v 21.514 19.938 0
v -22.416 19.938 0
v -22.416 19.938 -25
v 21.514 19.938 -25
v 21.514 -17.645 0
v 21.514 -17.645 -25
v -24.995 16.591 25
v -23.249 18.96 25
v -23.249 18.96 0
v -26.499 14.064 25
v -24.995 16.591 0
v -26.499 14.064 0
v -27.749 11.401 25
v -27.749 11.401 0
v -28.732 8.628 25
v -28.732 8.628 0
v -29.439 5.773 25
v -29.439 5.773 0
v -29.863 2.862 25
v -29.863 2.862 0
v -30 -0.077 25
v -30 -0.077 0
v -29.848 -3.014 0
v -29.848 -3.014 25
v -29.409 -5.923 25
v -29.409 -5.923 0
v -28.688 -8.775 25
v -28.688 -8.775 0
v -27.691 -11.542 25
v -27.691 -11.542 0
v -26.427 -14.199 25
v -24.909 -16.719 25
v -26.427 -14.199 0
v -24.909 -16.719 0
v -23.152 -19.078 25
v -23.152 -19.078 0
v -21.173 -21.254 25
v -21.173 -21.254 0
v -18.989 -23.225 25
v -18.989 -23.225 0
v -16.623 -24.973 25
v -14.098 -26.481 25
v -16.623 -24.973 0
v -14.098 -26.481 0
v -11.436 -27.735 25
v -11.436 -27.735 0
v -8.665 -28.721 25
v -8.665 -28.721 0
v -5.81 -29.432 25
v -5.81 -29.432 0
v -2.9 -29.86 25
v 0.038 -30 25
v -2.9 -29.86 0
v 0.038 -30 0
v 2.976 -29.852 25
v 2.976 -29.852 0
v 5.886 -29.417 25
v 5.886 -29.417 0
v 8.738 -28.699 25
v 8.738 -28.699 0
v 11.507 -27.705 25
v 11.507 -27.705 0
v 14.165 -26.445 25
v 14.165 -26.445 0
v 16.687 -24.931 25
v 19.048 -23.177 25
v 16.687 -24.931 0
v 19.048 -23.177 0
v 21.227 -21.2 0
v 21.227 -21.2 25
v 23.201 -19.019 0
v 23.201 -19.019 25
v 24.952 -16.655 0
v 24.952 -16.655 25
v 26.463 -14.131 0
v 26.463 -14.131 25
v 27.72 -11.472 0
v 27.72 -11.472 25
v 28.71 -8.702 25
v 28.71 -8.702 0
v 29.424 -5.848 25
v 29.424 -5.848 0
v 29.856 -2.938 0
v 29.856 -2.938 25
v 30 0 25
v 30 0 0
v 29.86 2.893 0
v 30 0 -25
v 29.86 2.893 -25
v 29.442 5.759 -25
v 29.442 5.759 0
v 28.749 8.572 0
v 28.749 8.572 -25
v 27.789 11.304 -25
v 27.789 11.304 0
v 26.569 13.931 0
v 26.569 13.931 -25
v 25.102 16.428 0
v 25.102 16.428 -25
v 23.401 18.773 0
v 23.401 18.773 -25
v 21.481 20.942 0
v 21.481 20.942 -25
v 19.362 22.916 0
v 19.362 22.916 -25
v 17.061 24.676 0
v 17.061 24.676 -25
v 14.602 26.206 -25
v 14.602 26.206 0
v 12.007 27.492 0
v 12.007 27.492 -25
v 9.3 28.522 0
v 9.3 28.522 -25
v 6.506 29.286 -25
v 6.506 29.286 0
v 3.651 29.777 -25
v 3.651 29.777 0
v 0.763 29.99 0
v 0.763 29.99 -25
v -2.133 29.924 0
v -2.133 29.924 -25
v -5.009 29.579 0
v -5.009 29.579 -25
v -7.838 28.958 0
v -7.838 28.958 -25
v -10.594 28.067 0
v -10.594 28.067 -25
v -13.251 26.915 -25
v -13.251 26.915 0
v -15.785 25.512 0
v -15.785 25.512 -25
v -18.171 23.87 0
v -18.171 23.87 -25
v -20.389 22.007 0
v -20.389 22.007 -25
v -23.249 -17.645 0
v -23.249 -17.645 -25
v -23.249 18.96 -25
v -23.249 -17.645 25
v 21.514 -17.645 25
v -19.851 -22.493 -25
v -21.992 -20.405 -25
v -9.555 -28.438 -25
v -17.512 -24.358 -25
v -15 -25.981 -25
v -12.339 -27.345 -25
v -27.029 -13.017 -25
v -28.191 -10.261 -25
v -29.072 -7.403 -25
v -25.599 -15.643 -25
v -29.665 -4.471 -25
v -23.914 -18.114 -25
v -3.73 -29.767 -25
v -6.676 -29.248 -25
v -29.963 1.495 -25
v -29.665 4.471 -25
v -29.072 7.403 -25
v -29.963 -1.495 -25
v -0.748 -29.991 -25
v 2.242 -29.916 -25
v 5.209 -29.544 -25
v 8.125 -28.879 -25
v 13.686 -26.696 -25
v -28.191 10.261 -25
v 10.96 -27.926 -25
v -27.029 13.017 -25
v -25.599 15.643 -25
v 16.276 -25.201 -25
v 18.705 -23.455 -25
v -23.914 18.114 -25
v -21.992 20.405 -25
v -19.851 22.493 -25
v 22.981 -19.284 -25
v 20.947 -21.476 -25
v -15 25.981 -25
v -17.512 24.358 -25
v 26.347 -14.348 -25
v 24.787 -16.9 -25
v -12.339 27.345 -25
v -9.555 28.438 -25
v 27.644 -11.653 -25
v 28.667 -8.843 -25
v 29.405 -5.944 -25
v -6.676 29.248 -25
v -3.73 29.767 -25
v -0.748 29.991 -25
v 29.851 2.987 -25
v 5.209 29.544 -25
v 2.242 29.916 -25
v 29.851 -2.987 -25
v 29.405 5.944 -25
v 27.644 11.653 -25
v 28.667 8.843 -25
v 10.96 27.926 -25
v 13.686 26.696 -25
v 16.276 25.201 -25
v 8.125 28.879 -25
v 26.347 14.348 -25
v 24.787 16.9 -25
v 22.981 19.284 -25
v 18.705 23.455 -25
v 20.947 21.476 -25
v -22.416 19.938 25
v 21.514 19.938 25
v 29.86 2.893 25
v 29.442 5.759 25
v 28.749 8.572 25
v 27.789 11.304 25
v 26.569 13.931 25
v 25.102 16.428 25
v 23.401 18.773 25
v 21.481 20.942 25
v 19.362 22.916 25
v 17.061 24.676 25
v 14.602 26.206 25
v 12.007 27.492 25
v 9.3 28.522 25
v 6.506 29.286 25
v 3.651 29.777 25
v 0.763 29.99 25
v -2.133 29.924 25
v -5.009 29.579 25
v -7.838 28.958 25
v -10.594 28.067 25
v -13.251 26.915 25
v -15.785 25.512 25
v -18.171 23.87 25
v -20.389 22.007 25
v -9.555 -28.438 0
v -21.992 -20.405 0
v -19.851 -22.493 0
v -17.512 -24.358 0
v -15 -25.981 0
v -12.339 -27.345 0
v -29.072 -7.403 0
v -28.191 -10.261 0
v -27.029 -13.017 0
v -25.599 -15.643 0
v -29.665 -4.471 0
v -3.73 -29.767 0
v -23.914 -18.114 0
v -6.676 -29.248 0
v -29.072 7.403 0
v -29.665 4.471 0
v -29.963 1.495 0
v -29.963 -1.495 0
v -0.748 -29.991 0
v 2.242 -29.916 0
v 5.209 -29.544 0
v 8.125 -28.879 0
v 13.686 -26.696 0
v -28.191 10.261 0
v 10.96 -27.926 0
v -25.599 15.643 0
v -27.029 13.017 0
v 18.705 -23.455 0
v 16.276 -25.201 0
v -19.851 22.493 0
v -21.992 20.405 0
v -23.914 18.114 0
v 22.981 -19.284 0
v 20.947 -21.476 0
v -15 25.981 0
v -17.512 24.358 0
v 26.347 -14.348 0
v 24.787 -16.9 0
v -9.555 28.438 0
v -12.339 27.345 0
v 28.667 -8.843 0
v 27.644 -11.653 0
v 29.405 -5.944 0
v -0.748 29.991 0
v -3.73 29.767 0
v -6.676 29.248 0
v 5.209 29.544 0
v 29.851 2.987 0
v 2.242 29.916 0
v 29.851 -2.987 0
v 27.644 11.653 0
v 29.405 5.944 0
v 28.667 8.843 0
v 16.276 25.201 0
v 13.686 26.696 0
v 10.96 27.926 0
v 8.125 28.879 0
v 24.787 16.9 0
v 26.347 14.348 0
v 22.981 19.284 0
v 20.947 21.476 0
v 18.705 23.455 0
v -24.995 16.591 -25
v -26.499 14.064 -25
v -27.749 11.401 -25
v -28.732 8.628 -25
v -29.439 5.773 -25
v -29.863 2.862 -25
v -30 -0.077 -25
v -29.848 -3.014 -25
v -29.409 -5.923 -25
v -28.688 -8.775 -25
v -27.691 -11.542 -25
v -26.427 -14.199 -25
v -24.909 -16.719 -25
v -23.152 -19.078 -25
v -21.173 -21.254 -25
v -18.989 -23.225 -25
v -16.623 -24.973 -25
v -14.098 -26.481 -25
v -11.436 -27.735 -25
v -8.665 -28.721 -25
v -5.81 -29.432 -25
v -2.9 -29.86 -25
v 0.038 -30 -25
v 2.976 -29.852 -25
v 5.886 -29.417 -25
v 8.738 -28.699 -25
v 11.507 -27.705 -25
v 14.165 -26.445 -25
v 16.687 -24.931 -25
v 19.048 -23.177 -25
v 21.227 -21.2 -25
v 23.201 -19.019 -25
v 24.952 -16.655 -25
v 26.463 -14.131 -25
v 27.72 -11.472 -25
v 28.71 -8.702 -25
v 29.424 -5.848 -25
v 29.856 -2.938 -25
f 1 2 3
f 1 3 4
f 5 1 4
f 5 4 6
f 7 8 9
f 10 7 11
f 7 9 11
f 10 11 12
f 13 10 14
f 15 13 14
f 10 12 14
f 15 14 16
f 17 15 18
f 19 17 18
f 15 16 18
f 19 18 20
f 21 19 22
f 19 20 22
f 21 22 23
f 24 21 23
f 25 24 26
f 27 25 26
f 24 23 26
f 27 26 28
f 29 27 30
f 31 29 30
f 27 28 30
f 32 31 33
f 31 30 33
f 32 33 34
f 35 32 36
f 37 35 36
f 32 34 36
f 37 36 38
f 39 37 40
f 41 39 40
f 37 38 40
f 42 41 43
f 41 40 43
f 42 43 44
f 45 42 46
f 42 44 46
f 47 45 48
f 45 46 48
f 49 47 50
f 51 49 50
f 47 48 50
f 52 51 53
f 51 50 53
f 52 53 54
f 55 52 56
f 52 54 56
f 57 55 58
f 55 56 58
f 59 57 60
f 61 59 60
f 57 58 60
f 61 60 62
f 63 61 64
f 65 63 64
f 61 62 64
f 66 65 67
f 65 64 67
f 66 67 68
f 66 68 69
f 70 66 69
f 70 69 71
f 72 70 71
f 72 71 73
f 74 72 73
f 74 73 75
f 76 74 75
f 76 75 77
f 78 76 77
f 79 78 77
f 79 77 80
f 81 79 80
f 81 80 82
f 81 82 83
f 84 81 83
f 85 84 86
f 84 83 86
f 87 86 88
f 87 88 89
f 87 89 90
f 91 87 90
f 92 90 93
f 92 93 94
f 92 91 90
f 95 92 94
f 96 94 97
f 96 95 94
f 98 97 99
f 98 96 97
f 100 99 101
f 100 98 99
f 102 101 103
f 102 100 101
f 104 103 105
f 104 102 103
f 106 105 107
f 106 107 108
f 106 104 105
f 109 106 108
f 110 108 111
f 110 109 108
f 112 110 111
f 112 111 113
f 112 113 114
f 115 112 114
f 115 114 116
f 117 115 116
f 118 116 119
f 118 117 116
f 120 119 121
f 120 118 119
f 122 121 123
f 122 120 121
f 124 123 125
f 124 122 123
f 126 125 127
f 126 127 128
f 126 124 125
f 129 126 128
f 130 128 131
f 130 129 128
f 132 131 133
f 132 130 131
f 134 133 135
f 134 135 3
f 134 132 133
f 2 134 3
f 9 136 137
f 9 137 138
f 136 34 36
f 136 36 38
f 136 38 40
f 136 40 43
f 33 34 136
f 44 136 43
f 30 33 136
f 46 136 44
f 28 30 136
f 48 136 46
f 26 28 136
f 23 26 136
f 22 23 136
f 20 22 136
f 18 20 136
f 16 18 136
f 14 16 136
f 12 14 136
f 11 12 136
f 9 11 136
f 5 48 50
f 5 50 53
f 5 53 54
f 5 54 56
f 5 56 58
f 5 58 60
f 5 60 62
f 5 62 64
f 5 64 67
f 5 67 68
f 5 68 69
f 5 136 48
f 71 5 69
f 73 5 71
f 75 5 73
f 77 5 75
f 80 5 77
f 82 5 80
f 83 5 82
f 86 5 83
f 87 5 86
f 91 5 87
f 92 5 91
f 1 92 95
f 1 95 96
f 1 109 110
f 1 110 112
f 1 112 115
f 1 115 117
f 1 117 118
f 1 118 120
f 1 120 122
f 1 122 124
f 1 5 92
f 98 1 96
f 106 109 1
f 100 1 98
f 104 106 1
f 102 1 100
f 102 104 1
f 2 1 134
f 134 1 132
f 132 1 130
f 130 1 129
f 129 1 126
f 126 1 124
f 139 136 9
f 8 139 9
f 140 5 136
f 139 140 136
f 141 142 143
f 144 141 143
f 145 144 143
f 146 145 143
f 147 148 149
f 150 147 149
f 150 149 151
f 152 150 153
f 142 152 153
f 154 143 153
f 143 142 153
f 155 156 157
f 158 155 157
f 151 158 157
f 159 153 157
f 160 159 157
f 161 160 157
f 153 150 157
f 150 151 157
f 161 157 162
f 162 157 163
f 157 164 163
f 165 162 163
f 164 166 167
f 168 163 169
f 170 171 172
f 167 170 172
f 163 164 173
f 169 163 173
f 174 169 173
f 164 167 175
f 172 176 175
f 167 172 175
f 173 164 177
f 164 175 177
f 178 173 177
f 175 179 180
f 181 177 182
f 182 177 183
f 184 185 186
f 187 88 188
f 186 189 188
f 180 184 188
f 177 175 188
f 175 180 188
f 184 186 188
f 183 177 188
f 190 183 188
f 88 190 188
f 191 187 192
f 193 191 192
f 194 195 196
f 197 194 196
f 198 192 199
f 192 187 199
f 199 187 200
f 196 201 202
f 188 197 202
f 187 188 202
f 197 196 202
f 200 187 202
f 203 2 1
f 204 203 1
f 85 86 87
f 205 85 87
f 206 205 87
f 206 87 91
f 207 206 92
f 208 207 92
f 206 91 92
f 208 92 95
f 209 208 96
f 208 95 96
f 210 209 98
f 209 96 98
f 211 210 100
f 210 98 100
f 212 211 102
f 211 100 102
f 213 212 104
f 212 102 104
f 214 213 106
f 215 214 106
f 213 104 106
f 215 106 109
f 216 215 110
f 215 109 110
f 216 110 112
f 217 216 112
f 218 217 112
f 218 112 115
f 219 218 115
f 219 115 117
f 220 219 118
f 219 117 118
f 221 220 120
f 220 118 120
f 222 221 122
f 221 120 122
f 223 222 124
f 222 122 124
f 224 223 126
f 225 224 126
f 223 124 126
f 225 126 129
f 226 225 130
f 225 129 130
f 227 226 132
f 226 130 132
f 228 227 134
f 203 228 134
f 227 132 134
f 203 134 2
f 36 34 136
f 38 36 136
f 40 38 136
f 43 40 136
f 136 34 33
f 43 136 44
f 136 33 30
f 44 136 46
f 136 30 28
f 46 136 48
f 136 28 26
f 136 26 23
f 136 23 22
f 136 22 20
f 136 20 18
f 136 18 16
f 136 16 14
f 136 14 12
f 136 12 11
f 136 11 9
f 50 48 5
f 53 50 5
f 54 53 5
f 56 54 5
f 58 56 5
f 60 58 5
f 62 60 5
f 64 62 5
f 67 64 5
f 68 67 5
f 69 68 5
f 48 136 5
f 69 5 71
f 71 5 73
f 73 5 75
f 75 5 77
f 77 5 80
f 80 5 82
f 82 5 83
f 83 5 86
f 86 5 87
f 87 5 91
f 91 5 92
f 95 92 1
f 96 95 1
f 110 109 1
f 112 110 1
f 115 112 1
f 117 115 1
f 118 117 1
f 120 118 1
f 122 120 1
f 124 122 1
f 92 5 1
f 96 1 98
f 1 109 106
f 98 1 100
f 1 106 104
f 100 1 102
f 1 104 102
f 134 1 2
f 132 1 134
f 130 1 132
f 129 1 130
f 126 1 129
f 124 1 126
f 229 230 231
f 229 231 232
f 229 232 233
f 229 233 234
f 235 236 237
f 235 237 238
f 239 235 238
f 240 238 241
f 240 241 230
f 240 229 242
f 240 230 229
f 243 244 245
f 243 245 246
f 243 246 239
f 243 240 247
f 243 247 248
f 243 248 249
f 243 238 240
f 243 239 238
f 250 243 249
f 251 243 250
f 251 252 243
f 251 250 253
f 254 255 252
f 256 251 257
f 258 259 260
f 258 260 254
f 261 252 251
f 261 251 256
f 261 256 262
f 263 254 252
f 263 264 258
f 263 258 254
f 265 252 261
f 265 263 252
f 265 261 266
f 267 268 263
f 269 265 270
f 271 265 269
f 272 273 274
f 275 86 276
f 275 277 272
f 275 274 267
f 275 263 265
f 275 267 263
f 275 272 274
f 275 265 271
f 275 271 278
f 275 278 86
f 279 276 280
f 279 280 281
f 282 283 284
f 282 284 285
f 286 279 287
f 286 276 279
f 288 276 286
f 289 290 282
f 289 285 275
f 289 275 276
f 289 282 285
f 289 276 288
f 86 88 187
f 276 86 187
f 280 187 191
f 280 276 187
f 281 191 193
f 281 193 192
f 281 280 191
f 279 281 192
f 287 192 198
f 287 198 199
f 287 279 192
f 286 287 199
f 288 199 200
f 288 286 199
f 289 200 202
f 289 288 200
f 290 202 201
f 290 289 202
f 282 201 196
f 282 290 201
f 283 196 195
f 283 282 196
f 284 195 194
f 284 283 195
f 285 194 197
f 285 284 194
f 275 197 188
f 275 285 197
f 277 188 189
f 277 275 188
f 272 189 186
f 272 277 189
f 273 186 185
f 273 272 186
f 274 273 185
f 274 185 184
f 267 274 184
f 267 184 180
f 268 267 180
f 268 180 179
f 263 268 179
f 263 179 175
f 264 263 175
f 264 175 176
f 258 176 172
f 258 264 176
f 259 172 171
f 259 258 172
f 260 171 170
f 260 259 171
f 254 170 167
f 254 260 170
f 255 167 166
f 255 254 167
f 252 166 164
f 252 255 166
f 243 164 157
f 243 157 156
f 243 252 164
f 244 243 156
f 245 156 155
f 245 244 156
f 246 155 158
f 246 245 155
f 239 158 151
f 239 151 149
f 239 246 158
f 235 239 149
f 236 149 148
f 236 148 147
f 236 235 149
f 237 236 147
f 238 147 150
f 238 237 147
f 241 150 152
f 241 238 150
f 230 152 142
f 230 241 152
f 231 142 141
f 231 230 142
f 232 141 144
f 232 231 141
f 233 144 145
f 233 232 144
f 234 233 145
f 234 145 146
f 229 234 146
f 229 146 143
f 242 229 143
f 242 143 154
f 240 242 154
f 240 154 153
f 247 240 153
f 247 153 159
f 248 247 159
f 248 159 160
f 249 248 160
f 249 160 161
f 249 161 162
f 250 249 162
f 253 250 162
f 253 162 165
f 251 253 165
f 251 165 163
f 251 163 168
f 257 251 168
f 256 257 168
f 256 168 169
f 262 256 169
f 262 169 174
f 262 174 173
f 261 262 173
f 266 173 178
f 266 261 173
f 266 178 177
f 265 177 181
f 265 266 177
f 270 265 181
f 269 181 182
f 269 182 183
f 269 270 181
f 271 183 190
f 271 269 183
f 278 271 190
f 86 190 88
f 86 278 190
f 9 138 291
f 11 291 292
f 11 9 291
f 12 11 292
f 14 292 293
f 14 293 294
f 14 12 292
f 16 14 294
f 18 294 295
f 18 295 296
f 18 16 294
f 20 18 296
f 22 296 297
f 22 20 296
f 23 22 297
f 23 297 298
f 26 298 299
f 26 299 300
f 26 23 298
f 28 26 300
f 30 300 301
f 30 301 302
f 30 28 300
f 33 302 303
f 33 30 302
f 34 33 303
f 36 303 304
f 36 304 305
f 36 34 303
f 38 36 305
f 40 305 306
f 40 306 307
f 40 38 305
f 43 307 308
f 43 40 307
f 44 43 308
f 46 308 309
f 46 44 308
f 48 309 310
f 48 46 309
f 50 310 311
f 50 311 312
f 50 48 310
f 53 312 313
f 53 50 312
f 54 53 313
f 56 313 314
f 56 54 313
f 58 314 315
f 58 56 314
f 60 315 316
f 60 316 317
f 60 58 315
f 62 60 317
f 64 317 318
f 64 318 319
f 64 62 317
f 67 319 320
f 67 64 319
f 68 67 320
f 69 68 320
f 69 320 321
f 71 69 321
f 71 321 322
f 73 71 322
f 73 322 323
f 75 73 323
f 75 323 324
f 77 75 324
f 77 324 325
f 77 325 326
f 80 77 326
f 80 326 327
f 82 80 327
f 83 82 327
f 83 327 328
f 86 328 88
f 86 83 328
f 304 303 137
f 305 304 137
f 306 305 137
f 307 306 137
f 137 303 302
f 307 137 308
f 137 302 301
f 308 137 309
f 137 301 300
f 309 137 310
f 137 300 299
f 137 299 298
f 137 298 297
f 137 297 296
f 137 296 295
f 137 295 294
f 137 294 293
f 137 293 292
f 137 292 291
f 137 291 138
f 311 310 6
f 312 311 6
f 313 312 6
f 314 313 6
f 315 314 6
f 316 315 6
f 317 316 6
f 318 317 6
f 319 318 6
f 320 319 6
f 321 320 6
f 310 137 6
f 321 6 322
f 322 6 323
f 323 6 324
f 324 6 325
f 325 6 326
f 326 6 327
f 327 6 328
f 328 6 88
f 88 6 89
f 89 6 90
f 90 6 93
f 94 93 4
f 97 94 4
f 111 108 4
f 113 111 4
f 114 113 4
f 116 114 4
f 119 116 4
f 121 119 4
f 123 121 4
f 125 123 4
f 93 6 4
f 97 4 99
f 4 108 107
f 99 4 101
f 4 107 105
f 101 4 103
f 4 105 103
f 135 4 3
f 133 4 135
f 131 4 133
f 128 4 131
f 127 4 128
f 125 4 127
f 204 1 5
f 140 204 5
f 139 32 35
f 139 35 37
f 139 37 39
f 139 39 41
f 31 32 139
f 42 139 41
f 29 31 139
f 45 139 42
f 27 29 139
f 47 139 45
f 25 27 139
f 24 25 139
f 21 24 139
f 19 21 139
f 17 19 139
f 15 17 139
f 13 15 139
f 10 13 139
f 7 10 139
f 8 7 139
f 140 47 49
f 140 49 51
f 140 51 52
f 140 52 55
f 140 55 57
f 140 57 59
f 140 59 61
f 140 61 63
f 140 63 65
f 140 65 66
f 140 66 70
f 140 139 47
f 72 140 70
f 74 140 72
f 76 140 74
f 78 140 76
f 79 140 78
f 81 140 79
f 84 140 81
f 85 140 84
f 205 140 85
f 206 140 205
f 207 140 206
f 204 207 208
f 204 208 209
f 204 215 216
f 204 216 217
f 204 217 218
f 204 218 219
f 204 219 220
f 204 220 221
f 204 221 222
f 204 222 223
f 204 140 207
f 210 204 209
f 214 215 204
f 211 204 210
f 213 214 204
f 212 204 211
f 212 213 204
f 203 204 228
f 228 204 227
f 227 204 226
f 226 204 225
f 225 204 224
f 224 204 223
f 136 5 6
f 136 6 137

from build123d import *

# Parameters (mm, degrees)
F0_R     = 30
F2_DEPTH = 25
F3_DEPTH = 25


with BuildPart() as f2:
    # F0 (on Top) → F2 (new body)
    with BuildSketch(Plane.XY):
        Circle(F0_R)
    extrude(amount=-F2_DEPTH)


with BuildPart() as f2b:
    # F1 (on face) → F2, piece 2 (new body)
    with BuildSketch(Plane.XY):
        with BuildLine():
            ThreePointArc((30, 0), (10.6658995578, 28.0399462664), (-22.4159057749, 19.9380833656))
            Line((-22.4159057749, 19.9380833656), (21.5137880296, 19.9380833656))
            Line((21.5137880296, 19.9380833656), (21.5137880296, -17.6452174783))
            Line((21.5137880296, -17.6452174783), (-23.2494380325, -17.6452174783))
            Line((-23.2494380325, -17.6452174783), (-23.2494380325, 18.9595261326))
            ThreePointArc((-23.2494380325, 18.9595261326), (-10.0627247559, -28.262016391), (30, 0))
        make_face()
    extrude(amount=-F2_DEPTH)


with BuildPart() as f3:
    # F3 (new): a face of the model
    f3_faces = [f2b.part.faces().sort_by_distance(p)[0] for p in [
        (-9.7781079194, -27.4626458534, 0),
    ]]
    extrude(f3_faces, amount=F3_DEPTH)


solid = Compound([f2.part, f2b.part, f3.part])
